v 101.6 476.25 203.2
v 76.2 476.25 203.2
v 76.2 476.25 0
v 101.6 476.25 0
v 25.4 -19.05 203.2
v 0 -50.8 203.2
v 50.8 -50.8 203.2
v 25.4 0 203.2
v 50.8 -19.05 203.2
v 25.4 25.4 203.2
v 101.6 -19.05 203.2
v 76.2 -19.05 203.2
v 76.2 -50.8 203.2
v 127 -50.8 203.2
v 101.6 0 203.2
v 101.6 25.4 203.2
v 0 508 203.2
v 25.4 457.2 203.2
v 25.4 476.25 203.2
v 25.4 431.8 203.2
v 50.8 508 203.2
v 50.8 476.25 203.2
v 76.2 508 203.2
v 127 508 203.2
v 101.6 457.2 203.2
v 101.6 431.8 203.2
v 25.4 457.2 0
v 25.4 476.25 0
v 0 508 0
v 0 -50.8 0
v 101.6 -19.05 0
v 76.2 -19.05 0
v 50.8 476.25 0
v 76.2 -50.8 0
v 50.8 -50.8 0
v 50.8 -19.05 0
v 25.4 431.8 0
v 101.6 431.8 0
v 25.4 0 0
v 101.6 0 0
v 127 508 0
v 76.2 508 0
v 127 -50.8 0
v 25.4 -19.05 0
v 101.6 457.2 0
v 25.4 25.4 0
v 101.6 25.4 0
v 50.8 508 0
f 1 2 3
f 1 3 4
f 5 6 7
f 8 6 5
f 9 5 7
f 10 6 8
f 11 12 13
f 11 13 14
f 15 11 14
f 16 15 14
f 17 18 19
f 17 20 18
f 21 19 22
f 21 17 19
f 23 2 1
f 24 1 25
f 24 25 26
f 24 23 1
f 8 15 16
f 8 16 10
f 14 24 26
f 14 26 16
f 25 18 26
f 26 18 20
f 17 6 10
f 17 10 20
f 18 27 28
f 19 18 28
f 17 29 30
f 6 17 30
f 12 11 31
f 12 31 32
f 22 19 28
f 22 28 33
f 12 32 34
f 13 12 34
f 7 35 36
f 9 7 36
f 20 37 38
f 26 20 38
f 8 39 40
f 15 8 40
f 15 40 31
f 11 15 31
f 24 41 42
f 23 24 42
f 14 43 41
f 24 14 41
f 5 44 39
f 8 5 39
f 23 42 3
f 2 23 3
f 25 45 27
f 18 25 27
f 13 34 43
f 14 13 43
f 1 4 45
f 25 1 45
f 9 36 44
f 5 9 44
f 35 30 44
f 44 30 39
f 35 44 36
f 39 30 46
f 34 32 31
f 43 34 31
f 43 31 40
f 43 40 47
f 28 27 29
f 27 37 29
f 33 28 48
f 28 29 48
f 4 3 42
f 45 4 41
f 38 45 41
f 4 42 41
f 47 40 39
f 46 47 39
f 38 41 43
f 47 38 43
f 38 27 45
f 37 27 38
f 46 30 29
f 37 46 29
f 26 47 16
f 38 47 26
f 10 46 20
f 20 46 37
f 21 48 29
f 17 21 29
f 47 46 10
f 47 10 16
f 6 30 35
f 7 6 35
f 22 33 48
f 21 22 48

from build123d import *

# Parameters (mm, degrees)
F0_W     = 76.2
F0_H     = 406.4
F1_DEPTH = 203.2


with BuildPart() as f1:
    # F0 (on Top) → F1 (new body)
    with BuildSketch(Plane.XY):
        Polygon((0, 457.2), (0, 0), (25.4, 0), (101.6, 0), (127, 0), (127, 457.2), (127, 508), (76.2, 508), (76.2, 476.25), (101.6, 476.25), (101.6, 457.2), (76.2, 457.2), (63.5, 457.2), (50.8, 457.2), (25.4, 457.2), (25.4, 476.25), (50.8, 476.25), (50.8, 508), (0, 508), align=None)
        with Locations((63.5, 228.6)):
            Rectangle(F0_W, F0_H, mode=Mode.SUBTRACT)
        Polygon((25.4, 0), (0, 0), (0, -50.8), (50.8, -50.8), (50.8, -19.05), (25.4, -19.05), align=None)
        Polygon((127, 0), (101.6, 0), (101.6, -19.05), (76.2, -19.05), (76.2, -50.8), (127, -50.8), align=None)
    extrude(amount=F1_DEPTH)


solid = f1.part
